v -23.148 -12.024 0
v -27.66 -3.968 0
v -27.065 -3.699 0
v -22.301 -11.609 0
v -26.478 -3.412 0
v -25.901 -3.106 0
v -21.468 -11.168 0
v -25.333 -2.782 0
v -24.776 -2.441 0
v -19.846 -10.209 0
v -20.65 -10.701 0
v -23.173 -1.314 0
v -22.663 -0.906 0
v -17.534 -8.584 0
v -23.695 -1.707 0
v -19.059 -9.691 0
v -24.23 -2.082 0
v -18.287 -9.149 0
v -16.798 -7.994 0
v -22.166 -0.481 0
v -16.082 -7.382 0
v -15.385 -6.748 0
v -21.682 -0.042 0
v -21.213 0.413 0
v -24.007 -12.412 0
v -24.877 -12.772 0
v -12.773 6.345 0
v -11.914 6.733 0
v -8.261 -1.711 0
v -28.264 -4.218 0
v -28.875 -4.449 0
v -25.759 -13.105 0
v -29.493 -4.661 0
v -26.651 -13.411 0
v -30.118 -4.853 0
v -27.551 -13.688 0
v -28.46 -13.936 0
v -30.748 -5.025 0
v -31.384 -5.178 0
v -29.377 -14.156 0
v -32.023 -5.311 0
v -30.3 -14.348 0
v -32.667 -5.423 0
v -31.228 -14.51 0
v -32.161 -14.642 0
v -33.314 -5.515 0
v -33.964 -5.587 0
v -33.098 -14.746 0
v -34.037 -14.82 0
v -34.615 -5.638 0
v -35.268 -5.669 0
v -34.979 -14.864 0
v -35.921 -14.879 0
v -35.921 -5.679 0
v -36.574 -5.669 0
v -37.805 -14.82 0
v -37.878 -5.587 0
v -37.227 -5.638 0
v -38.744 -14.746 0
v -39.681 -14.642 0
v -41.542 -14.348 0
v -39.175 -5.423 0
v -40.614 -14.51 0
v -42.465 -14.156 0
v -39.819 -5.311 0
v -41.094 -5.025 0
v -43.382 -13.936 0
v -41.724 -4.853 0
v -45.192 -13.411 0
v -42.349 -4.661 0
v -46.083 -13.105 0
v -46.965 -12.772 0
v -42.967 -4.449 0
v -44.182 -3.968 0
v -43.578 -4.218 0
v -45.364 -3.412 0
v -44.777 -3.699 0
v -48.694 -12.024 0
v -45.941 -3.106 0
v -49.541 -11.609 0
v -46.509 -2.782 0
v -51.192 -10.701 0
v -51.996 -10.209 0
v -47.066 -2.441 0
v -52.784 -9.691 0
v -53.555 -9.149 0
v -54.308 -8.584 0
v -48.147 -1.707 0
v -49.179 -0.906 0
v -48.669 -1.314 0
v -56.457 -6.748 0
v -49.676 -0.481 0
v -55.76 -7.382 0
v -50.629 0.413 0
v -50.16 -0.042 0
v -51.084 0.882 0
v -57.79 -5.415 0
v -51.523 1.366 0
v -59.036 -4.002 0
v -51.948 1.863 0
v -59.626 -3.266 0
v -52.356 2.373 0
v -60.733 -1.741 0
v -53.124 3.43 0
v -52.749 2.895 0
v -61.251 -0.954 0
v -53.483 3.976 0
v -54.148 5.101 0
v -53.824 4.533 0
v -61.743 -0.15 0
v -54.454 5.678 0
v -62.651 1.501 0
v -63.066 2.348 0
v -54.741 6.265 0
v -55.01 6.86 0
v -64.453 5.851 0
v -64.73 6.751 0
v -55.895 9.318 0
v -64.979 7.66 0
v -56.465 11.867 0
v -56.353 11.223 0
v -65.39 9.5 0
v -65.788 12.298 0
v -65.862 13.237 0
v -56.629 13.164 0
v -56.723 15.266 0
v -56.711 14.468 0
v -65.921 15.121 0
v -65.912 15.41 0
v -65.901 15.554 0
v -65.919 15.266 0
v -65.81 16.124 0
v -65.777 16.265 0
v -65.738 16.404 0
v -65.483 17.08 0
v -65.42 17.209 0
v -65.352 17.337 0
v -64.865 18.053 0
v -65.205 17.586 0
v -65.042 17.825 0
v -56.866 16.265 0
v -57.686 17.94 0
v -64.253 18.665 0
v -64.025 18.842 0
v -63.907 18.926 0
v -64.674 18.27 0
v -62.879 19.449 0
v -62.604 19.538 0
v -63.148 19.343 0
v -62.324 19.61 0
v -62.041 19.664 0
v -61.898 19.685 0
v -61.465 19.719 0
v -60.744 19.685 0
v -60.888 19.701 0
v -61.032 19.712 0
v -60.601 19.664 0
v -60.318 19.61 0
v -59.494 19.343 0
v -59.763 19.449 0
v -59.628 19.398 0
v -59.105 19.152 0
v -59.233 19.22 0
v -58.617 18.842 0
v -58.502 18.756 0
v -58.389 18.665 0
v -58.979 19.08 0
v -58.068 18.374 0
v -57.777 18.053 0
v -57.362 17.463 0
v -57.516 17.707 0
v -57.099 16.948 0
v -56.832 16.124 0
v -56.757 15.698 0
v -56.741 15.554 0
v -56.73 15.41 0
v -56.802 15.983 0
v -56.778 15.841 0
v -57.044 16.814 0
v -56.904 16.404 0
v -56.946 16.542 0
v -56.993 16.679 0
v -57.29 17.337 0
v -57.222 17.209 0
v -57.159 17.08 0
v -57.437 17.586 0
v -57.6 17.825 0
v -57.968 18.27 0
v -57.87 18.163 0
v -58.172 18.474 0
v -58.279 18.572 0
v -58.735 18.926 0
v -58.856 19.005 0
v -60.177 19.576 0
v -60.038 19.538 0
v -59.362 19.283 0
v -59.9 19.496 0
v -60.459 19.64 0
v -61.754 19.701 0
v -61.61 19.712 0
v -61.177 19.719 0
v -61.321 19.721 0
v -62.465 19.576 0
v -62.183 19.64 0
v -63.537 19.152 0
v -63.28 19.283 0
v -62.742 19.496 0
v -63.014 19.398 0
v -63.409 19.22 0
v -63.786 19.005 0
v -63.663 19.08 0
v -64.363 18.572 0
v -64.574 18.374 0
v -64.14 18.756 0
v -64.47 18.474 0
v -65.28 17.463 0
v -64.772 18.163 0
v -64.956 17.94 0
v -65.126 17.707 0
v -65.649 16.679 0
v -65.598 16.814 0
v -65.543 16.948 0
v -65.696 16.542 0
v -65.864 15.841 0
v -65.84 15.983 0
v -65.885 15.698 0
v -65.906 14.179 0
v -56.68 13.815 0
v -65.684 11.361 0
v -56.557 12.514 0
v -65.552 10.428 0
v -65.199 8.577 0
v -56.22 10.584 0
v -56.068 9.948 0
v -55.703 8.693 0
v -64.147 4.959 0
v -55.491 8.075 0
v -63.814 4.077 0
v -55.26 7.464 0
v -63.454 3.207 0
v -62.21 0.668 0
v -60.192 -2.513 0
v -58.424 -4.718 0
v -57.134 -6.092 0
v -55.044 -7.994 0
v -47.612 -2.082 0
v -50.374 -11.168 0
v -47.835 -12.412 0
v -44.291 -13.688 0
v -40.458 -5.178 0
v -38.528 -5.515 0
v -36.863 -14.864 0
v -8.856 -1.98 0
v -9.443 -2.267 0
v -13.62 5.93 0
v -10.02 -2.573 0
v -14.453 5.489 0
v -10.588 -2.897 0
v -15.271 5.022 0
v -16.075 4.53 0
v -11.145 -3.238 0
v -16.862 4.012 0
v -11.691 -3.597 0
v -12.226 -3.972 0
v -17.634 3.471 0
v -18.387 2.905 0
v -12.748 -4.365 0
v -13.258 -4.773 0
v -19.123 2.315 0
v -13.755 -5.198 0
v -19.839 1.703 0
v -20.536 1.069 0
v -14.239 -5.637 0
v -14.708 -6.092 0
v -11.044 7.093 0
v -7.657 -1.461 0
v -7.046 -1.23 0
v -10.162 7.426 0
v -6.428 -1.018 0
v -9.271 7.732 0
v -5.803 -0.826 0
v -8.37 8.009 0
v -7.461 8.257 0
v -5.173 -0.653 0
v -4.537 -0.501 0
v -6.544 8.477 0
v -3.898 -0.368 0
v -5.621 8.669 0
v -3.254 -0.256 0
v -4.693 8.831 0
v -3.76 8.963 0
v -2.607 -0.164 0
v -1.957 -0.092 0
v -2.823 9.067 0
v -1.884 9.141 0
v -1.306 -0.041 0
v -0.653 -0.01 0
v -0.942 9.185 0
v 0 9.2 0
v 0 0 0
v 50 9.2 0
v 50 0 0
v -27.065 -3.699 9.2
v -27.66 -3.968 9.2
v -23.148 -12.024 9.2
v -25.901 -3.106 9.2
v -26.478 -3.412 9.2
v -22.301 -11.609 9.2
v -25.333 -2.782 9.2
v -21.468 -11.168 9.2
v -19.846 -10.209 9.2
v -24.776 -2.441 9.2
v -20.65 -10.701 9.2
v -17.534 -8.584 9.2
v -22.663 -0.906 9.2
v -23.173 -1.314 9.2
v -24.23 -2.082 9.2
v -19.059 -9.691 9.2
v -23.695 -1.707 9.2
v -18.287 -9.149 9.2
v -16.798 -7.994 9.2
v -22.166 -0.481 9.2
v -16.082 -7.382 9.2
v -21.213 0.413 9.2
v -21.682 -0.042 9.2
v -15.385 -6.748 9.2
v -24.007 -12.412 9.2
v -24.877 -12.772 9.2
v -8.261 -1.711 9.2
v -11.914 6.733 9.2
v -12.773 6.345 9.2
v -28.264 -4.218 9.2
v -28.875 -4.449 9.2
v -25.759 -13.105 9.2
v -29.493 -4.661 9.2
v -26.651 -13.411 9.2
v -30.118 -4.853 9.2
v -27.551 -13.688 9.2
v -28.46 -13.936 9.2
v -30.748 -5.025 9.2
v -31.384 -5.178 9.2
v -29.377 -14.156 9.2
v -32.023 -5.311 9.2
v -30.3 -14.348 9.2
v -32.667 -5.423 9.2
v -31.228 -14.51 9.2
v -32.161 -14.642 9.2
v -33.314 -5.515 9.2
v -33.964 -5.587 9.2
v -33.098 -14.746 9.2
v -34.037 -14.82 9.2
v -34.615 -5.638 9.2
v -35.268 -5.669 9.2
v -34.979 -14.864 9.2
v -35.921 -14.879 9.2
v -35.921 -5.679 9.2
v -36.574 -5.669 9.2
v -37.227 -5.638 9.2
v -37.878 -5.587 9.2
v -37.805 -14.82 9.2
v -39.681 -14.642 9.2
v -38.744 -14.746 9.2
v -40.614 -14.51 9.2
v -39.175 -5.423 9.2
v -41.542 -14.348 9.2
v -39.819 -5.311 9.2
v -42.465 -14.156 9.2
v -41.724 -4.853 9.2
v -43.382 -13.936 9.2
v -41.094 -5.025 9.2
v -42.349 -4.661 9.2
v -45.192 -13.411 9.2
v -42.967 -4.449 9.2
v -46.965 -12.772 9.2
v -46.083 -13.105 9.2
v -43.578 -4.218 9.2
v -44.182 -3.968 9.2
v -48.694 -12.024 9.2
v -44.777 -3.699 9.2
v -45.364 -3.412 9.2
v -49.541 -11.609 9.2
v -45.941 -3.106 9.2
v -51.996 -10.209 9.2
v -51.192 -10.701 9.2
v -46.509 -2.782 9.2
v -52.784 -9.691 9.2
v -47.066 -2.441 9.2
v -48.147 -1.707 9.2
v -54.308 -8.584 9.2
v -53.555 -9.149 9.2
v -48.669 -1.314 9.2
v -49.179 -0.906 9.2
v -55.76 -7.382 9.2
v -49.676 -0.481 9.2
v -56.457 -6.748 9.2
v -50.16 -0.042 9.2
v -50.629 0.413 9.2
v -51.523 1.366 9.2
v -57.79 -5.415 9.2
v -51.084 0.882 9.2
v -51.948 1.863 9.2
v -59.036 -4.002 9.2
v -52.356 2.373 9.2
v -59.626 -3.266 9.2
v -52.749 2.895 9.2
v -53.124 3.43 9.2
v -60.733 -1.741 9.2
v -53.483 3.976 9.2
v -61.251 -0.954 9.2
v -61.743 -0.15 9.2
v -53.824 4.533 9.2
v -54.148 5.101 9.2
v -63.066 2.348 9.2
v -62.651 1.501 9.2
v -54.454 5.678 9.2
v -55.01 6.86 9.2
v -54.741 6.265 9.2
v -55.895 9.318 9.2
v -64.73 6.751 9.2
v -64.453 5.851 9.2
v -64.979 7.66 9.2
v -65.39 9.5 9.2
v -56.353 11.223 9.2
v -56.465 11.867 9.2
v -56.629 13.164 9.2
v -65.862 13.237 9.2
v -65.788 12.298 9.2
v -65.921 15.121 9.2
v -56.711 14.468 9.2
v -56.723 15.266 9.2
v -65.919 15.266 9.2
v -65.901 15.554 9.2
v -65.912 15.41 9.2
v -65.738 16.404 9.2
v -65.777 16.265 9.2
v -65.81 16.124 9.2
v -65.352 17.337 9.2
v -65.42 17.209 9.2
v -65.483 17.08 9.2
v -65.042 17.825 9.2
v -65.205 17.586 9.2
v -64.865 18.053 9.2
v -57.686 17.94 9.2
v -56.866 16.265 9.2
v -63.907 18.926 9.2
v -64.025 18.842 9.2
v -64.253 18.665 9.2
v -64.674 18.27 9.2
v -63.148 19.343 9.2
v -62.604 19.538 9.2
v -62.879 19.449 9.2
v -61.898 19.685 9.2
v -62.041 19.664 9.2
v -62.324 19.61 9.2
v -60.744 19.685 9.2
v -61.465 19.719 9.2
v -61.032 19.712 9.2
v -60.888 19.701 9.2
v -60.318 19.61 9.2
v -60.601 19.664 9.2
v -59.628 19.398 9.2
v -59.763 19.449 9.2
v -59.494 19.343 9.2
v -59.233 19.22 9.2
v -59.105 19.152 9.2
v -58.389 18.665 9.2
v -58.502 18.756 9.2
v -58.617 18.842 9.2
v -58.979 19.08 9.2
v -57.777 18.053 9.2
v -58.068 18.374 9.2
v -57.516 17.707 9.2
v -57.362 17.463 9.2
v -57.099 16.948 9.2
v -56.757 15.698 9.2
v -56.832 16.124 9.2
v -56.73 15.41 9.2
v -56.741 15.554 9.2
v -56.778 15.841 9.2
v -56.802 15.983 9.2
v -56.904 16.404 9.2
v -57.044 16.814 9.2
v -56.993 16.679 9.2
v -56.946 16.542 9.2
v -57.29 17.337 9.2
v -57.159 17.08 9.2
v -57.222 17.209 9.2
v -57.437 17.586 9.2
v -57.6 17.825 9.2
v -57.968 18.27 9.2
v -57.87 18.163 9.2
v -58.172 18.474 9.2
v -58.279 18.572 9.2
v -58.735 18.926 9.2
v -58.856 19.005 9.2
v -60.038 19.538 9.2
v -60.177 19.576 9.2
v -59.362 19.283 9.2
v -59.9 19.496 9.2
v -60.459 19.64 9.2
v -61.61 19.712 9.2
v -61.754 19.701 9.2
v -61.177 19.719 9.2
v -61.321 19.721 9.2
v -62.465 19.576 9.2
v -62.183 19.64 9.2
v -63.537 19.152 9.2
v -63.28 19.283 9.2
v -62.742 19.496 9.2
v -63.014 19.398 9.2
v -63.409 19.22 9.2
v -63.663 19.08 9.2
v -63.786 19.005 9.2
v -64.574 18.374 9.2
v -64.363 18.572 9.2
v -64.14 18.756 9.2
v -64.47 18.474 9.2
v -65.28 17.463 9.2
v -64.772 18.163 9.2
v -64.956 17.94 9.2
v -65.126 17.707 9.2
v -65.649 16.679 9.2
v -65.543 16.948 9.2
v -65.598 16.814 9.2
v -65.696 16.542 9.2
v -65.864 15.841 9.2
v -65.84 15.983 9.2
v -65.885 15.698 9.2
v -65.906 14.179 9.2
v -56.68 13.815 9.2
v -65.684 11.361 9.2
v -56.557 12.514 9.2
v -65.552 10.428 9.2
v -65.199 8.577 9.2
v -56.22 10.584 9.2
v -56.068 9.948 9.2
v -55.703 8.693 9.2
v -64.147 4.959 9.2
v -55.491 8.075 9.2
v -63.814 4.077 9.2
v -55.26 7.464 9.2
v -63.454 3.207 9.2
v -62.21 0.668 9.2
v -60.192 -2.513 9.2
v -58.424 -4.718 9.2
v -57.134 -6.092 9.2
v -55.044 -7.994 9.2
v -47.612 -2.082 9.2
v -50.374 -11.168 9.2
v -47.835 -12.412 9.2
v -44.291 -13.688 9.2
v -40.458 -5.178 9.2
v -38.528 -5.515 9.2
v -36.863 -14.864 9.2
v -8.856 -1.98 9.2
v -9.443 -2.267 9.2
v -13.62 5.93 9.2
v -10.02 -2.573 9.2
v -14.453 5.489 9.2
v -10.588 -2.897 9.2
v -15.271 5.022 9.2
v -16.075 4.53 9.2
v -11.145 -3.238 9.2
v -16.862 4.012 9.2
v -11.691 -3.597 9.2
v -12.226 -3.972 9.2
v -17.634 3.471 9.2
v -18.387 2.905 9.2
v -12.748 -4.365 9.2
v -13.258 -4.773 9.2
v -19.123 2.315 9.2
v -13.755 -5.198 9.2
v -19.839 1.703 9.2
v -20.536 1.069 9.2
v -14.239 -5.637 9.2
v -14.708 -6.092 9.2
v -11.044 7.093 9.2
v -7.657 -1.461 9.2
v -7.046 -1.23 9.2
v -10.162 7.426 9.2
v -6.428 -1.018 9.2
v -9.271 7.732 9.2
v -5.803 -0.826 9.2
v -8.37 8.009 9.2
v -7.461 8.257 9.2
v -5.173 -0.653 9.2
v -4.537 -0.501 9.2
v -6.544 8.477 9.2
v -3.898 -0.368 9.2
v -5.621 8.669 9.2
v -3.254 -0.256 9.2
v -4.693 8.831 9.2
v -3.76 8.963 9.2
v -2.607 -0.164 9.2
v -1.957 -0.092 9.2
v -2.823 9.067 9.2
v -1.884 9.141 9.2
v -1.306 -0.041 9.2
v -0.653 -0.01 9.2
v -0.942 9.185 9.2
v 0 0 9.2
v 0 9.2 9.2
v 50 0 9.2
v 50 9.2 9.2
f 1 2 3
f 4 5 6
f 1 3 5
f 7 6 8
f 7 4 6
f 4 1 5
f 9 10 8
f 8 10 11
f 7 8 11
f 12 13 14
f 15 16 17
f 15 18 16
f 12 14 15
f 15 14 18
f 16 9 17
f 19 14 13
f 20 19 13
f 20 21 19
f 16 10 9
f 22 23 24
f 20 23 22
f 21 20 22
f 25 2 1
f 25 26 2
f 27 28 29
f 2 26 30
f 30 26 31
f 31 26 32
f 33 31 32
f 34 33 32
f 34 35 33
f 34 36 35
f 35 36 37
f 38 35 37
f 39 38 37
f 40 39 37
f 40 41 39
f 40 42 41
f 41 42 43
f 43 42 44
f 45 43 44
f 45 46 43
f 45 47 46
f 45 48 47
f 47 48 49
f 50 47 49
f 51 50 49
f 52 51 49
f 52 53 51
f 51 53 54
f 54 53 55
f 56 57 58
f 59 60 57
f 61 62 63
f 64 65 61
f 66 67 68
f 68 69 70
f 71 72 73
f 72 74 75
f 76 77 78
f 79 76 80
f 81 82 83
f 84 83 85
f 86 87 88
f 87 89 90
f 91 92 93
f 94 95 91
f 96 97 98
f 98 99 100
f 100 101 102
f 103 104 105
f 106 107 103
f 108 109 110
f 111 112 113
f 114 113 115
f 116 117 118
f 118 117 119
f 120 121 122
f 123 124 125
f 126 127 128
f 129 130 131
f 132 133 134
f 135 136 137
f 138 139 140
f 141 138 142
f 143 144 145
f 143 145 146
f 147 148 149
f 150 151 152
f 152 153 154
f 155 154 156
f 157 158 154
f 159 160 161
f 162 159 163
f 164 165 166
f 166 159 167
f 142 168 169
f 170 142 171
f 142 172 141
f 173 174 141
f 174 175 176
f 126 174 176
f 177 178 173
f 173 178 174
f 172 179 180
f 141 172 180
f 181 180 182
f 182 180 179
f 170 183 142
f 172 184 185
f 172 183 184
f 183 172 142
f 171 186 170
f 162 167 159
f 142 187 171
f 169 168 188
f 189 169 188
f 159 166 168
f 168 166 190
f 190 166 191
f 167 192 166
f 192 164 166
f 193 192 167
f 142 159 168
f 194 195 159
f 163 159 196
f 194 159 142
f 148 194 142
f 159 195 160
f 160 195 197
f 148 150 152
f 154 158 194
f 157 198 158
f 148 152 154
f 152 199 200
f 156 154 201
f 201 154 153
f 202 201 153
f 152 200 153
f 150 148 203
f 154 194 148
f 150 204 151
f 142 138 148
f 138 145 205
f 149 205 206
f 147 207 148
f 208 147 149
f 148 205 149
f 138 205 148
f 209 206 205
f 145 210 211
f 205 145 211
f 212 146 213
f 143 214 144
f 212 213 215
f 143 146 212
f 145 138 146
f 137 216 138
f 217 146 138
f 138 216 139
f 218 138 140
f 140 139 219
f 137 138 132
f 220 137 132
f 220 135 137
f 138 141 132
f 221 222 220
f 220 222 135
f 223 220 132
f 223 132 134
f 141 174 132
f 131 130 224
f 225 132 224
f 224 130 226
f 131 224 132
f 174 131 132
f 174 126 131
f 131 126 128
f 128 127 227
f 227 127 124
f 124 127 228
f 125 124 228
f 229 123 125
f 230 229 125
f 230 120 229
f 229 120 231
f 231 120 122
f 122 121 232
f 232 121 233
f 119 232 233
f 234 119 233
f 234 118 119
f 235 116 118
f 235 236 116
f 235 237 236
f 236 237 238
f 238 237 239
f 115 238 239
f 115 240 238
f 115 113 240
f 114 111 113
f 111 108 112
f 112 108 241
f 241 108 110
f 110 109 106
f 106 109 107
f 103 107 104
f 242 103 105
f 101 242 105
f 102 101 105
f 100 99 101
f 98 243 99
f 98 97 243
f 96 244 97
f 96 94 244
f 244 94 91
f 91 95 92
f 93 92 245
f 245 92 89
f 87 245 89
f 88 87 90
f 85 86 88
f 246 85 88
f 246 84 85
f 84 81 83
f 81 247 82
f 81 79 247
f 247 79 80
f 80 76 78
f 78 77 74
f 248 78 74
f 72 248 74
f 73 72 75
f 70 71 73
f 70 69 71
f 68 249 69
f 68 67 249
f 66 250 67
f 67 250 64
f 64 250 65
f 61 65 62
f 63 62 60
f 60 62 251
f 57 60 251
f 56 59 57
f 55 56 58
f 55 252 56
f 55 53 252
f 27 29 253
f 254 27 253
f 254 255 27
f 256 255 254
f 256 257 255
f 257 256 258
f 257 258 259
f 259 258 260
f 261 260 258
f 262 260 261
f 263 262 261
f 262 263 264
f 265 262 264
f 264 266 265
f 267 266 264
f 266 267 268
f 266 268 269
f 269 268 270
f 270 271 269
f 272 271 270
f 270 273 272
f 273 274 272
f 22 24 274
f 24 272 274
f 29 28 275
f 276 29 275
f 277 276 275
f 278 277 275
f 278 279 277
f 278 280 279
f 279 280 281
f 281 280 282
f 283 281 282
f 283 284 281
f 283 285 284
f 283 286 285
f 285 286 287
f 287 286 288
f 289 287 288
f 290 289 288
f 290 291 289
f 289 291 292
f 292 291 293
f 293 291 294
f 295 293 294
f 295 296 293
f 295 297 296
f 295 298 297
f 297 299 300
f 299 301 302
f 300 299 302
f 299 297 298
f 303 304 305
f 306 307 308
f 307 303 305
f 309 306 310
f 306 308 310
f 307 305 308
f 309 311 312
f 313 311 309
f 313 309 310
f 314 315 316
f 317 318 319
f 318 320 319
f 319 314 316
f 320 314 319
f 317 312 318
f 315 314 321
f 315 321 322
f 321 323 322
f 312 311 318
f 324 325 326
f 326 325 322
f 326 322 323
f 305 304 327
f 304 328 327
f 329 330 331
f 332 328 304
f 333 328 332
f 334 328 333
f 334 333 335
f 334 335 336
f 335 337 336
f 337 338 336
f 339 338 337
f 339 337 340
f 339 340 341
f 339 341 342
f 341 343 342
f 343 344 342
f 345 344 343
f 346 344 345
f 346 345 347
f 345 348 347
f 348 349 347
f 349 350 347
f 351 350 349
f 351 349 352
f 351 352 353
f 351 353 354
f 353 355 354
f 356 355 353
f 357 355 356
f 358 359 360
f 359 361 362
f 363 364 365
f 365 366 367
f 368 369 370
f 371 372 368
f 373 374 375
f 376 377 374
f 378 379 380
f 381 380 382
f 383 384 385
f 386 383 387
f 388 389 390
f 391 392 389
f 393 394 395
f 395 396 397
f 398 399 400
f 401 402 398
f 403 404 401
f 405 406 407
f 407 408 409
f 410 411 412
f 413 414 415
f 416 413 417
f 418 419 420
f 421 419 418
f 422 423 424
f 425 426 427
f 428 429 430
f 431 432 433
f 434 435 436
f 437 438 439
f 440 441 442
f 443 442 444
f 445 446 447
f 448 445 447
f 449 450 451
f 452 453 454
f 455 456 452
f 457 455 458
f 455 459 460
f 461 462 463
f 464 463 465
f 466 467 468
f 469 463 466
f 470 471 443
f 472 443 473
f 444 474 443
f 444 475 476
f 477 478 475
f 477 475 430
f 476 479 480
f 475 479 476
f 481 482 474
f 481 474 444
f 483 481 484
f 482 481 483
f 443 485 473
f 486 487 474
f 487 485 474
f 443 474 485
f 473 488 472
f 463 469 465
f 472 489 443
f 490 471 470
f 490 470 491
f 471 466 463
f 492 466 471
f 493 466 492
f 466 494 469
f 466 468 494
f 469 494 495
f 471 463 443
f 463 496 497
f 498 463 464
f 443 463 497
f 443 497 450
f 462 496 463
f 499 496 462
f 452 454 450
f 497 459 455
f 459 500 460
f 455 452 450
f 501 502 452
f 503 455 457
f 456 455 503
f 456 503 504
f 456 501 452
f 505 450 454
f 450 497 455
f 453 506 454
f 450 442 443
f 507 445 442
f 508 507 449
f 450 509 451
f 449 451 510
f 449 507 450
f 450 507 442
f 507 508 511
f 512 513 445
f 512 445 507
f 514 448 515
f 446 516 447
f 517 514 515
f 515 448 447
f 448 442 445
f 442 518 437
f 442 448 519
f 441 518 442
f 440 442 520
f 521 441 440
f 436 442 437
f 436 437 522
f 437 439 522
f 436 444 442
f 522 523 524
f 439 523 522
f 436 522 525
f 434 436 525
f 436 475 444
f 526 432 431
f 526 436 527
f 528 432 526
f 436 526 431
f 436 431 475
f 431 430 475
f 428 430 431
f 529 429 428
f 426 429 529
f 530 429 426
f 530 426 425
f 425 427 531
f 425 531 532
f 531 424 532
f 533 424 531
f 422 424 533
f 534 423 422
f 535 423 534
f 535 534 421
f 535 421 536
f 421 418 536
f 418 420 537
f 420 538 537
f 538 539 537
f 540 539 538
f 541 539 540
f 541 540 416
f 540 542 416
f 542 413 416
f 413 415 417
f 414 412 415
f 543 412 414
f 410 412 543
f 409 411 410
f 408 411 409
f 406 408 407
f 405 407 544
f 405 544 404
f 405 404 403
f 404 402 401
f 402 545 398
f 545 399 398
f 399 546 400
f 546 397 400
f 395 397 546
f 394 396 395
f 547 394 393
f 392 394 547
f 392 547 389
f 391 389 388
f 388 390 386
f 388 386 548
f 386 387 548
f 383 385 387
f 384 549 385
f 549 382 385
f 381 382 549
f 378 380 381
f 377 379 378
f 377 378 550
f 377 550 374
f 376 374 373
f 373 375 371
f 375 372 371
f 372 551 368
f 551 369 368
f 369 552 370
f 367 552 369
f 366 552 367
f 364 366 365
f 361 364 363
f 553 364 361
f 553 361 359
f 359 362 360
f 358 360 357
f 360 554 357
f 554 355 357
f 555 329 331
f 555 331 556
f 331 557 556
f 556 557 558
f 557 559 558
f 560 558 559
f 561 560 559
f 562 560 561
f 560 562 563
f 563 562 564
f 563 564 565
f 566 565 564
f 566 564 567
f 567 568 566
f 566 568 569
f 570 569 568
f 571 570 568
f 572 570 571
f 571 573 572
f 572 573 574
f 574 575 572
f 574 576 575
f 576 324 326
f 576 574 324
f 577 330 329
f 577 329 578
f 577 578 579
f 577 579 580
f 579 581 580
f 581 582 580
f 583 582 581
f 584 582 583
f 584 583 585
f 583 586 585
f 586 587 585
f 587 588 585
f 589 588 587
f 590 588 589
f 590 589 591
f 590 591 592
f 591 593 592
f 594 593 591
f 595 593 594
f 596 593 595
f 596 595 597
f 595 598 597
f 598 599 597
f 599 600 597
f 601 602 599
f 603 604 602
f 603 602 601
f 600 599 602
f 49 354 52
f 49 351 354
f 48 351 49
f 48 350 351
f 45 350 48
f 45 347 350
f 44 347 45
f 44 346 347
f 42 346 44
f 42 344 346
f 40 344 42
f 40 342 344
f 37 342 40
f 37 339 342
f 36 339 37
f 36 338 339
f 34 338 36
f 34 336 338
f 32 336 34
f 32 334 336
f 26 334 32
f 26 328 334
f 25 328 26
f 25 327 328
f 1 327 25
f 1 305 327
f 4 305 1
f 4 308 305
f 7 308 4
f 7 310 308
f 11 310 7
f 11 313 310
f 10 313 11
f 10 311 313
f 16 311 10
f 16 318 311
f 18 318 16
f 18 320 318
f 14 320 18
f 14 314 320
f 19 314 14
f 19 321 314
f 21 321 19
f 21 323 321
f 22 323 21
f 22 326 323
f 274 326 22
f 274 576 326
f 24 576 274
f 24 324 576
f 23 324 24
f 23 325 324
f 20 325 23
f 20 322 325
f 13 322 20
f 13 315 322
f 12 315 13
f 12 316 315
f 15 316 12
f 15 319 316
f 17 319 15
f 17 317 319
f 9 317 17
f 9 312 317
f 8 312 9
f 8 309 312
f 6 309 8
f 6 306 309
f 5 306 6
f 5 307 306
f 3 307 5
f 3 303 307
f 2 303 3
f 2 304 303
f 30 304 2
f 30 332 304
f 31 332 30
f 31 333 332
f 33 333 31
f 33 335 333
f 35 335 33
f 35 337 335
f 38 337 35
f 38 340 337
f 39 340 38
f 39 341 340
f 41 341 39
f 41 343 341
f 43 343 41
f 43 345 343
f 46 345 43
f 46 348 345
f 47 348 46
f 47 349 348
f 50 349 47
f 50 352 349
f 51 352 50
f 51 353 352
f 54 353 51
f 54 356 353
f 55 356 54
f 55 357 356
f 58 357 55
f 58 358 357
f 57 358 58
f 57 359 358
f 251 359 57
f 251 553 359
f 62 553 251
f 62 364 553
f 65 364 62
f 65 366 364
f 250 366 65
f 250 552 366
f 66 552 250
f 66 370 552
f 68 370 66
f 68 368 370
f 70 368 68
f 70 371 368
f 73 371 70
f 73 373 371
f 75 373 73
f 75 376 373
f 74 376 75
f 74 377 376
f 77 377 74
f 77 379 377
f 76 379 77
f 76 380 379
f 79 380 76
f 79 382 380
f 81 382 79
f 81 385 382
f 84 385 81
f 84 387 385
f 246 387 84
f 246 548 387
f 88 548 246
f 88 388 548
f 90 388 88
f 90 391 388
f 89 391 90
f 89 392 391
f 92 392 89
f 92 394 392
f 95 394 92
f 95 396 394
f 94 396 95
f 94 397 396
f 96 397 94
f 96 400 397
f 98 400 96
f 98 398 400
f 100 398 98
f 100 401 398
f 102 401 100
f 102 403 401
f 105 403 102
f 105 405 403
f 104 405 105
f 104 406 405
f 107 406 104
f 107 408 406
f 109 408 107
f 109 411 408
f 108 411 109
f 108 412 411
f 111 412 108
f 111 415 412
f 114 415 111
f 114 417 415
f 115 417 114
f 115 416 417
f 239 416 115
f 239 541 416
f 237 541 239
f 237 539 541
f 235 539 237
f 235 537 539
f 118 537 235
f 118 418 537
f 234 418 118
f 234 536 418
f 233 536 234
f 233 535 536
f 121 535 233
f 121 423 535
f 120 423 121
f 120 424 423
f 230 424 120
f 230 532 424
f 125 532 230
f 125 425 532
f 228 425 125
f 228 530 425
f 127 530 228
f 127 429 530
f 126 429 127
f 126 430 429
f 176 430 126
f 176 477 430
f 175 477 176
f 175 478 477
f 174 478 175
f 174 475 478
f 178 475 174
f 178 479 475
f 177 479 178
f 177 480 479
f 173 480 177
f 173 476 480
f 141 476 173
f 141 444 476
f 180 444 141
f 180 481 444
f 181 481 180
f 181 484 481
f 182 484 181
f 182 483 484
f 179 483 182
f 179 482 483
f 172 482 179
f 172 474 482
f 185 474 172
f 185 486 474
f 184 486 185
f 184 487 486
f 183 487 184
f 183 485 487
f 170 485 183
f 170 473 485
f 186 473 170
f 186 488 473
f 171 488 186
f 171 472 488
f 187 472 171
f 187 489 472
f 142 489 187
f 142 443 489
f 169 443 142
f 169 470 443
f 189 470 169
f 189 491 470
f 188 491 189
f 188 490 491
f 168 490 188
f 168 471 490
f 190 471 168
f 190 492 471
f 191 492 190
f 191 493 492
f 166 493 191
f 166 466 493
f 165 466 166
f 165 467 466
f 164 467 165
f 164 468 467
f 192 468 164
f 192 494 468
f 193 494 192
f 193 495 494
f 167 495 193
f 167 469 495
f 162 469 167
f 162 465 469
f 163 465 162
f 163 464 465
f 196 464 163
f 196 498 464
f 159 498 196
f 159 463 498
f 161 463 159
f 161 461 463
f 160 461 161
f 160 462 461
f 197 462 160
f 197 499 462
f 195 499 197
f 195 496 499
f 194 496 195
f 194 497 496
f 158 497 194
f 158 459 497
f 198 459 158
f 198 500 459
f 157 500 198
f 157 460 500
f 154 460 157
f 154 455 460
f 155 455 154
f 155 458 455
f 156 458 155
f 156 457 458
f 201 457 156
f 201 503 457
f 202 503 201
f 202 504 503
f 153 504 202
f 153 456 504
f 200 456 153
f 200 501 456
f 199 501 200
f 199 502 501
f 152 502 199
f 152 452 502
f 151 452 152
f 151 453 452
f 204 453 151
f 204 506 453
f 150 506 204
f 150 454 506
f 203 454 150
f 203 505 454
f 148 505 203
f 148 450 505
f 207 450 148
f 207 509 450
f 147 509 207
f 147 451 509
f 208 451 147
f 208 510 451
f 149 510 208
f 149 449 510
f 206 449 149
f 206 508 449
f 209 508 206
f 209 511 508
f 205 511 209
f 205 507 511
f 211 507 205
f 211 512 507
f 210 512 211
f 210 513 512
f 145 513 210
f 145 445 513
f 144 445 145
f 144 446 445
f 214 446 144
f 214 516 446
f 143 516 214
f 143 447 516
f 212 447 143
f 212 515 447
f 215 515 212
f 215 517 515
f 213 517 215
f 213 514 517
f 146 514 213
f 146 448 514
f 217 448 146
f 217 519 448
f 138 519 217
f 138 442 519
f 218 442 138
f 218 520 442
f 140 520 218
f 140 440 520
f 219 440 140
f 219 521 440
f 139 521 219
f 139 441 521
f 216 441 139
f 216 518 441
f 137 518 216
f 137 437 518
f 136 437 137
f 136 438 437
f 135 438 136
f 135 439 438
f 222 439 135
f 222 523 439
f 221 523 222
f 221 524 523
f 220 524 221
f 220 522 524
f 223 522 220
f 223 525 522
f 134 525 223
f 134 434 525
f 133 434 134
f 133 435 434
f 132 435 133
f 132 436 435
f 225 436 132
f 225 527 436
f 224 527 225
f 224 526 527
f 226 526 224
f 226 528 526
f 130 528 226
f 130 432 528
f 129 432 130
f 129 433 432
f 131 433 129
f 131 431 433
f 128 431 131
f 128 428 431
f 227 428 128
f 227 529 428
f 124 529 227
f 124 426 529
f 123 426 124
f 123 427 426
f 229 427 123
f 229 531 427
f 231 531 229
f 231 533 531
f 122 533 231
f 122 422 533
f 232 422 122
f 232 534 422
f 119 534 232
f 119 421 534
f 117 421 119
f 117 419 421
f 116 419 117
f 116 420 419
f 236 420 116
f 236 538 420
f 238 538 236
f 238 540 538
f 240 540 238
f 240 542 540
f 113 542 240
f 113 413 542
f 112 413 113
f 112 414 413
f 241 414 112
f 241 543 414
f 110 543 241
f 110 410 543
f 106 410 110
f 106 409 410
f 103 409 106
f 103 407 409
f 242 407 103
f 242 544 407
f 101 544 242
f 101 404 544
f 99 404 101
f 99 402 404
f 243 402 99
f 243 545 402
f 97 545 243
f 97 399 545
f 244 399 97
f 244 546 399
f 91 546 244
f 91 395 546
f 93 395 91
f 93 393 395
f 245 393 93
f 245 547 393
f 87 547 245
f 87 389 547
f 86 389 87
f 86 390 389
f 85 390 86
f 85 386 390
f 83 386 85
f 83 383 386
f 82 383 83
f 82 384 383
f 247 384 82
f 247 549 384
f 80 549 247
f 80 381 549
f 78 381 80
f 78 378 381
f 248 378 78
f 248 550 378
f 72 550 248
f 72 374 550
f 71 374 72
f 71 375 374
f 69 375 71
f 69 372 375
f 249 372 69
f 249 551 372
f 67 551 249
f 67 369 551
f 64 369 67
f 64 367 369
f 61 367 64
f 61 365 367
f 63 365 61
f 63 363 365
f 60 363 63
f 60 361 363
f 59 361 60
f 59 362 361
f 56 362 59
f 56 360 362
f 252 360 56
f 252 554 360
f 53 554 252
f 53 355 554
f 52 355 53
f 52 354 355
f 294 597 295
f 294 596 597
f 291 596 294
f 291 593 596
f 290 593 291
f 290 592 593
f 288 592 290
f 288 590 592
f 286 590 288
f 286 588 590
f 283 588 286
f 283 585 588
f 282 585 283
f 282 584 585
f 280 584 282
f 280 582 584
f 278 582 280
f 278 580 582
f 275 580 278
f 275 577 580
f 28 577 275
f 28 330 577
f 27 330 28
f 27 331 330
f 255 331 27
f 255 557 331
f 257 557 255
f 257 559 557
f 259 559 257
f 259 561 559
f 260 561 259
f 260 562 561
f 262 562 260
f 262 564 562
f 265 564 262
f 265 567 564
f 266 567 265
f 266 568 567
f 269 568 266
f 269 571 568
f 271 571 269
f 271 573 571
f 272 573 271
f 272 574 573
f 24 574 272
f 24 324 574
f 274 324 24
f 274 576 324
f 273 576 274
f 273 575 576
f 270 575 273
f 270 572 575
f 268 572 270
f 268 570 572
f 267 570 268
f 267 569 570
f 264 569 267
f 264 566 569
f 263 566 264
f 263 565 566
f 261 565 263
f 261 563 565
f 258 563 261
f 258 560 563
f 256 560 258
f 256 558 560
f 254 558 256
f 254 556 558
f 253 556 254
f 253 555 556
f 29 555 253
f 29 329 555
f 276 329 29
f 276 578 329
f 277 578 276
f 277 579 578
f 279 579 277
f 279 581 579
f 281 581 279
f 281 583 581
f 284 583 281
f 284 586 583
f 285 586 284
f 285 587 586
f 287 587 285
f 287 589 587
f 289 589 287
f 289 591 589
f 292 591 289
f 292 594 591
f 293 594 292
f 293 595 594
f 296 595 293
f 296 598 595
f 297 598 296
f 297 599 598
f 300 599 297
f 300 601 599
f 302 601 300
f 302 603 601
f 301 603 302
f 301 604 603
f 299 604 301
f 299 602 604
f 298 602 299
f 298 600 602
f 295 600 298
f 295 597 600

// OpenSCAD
t_z = 50;
t_p_h_a = 10;
t_p_h_b = 10;
t_p_h_p = 0.92;
t_p_h_a_t = t_p_h_p * t_p_h_a;
t_p_h_b_t = t_p_h_p * t_p_h_b;
h_r = 30;

module hook_profile() {
  square([t_z, t_p_h_a_t]);
  translate([0, t_p_h_a_t - h_r]) {
    intersection() {
      difference() {
        circle(r = h_r, $fn = 200);
        circle(r = h_r - t_p_h_a_t, $fn = 200);
      }
      polygon([[0, 0], [-h_r, h_r], [0, h_r]]);
    }
  }
  translate([(t_p_h_a_t - 2*h_r)/sqrt(2), t_p_h_a_t - h_r + (2*h_r - t_p_h_a_t)/sqrt(2)]) {
    intersection() {
      difference() {
        circle(r = h_r, $fn = 200);
        circle(r = h_r - t_p_h_a_t, $fn = 200);
      }
      polygon([[0, 0], [h_r, -h_r], [-h_r, -h_r], [-h_r, 0]]);
    }
  }
  translate([(t_p_h_a_t - 2*h_r)/sqrt(2) - h_r + t_p_h_a_t/2, t_p_h_a_t - h_r + (2*h_r - t_p_h_a_t)/sqrt(2)]) {
    circle(d = t_p_h_a_t, $fn = 200);
  }
}

linear_extrude(height = t_p_h_b_t) {
  hook_profile();
}
